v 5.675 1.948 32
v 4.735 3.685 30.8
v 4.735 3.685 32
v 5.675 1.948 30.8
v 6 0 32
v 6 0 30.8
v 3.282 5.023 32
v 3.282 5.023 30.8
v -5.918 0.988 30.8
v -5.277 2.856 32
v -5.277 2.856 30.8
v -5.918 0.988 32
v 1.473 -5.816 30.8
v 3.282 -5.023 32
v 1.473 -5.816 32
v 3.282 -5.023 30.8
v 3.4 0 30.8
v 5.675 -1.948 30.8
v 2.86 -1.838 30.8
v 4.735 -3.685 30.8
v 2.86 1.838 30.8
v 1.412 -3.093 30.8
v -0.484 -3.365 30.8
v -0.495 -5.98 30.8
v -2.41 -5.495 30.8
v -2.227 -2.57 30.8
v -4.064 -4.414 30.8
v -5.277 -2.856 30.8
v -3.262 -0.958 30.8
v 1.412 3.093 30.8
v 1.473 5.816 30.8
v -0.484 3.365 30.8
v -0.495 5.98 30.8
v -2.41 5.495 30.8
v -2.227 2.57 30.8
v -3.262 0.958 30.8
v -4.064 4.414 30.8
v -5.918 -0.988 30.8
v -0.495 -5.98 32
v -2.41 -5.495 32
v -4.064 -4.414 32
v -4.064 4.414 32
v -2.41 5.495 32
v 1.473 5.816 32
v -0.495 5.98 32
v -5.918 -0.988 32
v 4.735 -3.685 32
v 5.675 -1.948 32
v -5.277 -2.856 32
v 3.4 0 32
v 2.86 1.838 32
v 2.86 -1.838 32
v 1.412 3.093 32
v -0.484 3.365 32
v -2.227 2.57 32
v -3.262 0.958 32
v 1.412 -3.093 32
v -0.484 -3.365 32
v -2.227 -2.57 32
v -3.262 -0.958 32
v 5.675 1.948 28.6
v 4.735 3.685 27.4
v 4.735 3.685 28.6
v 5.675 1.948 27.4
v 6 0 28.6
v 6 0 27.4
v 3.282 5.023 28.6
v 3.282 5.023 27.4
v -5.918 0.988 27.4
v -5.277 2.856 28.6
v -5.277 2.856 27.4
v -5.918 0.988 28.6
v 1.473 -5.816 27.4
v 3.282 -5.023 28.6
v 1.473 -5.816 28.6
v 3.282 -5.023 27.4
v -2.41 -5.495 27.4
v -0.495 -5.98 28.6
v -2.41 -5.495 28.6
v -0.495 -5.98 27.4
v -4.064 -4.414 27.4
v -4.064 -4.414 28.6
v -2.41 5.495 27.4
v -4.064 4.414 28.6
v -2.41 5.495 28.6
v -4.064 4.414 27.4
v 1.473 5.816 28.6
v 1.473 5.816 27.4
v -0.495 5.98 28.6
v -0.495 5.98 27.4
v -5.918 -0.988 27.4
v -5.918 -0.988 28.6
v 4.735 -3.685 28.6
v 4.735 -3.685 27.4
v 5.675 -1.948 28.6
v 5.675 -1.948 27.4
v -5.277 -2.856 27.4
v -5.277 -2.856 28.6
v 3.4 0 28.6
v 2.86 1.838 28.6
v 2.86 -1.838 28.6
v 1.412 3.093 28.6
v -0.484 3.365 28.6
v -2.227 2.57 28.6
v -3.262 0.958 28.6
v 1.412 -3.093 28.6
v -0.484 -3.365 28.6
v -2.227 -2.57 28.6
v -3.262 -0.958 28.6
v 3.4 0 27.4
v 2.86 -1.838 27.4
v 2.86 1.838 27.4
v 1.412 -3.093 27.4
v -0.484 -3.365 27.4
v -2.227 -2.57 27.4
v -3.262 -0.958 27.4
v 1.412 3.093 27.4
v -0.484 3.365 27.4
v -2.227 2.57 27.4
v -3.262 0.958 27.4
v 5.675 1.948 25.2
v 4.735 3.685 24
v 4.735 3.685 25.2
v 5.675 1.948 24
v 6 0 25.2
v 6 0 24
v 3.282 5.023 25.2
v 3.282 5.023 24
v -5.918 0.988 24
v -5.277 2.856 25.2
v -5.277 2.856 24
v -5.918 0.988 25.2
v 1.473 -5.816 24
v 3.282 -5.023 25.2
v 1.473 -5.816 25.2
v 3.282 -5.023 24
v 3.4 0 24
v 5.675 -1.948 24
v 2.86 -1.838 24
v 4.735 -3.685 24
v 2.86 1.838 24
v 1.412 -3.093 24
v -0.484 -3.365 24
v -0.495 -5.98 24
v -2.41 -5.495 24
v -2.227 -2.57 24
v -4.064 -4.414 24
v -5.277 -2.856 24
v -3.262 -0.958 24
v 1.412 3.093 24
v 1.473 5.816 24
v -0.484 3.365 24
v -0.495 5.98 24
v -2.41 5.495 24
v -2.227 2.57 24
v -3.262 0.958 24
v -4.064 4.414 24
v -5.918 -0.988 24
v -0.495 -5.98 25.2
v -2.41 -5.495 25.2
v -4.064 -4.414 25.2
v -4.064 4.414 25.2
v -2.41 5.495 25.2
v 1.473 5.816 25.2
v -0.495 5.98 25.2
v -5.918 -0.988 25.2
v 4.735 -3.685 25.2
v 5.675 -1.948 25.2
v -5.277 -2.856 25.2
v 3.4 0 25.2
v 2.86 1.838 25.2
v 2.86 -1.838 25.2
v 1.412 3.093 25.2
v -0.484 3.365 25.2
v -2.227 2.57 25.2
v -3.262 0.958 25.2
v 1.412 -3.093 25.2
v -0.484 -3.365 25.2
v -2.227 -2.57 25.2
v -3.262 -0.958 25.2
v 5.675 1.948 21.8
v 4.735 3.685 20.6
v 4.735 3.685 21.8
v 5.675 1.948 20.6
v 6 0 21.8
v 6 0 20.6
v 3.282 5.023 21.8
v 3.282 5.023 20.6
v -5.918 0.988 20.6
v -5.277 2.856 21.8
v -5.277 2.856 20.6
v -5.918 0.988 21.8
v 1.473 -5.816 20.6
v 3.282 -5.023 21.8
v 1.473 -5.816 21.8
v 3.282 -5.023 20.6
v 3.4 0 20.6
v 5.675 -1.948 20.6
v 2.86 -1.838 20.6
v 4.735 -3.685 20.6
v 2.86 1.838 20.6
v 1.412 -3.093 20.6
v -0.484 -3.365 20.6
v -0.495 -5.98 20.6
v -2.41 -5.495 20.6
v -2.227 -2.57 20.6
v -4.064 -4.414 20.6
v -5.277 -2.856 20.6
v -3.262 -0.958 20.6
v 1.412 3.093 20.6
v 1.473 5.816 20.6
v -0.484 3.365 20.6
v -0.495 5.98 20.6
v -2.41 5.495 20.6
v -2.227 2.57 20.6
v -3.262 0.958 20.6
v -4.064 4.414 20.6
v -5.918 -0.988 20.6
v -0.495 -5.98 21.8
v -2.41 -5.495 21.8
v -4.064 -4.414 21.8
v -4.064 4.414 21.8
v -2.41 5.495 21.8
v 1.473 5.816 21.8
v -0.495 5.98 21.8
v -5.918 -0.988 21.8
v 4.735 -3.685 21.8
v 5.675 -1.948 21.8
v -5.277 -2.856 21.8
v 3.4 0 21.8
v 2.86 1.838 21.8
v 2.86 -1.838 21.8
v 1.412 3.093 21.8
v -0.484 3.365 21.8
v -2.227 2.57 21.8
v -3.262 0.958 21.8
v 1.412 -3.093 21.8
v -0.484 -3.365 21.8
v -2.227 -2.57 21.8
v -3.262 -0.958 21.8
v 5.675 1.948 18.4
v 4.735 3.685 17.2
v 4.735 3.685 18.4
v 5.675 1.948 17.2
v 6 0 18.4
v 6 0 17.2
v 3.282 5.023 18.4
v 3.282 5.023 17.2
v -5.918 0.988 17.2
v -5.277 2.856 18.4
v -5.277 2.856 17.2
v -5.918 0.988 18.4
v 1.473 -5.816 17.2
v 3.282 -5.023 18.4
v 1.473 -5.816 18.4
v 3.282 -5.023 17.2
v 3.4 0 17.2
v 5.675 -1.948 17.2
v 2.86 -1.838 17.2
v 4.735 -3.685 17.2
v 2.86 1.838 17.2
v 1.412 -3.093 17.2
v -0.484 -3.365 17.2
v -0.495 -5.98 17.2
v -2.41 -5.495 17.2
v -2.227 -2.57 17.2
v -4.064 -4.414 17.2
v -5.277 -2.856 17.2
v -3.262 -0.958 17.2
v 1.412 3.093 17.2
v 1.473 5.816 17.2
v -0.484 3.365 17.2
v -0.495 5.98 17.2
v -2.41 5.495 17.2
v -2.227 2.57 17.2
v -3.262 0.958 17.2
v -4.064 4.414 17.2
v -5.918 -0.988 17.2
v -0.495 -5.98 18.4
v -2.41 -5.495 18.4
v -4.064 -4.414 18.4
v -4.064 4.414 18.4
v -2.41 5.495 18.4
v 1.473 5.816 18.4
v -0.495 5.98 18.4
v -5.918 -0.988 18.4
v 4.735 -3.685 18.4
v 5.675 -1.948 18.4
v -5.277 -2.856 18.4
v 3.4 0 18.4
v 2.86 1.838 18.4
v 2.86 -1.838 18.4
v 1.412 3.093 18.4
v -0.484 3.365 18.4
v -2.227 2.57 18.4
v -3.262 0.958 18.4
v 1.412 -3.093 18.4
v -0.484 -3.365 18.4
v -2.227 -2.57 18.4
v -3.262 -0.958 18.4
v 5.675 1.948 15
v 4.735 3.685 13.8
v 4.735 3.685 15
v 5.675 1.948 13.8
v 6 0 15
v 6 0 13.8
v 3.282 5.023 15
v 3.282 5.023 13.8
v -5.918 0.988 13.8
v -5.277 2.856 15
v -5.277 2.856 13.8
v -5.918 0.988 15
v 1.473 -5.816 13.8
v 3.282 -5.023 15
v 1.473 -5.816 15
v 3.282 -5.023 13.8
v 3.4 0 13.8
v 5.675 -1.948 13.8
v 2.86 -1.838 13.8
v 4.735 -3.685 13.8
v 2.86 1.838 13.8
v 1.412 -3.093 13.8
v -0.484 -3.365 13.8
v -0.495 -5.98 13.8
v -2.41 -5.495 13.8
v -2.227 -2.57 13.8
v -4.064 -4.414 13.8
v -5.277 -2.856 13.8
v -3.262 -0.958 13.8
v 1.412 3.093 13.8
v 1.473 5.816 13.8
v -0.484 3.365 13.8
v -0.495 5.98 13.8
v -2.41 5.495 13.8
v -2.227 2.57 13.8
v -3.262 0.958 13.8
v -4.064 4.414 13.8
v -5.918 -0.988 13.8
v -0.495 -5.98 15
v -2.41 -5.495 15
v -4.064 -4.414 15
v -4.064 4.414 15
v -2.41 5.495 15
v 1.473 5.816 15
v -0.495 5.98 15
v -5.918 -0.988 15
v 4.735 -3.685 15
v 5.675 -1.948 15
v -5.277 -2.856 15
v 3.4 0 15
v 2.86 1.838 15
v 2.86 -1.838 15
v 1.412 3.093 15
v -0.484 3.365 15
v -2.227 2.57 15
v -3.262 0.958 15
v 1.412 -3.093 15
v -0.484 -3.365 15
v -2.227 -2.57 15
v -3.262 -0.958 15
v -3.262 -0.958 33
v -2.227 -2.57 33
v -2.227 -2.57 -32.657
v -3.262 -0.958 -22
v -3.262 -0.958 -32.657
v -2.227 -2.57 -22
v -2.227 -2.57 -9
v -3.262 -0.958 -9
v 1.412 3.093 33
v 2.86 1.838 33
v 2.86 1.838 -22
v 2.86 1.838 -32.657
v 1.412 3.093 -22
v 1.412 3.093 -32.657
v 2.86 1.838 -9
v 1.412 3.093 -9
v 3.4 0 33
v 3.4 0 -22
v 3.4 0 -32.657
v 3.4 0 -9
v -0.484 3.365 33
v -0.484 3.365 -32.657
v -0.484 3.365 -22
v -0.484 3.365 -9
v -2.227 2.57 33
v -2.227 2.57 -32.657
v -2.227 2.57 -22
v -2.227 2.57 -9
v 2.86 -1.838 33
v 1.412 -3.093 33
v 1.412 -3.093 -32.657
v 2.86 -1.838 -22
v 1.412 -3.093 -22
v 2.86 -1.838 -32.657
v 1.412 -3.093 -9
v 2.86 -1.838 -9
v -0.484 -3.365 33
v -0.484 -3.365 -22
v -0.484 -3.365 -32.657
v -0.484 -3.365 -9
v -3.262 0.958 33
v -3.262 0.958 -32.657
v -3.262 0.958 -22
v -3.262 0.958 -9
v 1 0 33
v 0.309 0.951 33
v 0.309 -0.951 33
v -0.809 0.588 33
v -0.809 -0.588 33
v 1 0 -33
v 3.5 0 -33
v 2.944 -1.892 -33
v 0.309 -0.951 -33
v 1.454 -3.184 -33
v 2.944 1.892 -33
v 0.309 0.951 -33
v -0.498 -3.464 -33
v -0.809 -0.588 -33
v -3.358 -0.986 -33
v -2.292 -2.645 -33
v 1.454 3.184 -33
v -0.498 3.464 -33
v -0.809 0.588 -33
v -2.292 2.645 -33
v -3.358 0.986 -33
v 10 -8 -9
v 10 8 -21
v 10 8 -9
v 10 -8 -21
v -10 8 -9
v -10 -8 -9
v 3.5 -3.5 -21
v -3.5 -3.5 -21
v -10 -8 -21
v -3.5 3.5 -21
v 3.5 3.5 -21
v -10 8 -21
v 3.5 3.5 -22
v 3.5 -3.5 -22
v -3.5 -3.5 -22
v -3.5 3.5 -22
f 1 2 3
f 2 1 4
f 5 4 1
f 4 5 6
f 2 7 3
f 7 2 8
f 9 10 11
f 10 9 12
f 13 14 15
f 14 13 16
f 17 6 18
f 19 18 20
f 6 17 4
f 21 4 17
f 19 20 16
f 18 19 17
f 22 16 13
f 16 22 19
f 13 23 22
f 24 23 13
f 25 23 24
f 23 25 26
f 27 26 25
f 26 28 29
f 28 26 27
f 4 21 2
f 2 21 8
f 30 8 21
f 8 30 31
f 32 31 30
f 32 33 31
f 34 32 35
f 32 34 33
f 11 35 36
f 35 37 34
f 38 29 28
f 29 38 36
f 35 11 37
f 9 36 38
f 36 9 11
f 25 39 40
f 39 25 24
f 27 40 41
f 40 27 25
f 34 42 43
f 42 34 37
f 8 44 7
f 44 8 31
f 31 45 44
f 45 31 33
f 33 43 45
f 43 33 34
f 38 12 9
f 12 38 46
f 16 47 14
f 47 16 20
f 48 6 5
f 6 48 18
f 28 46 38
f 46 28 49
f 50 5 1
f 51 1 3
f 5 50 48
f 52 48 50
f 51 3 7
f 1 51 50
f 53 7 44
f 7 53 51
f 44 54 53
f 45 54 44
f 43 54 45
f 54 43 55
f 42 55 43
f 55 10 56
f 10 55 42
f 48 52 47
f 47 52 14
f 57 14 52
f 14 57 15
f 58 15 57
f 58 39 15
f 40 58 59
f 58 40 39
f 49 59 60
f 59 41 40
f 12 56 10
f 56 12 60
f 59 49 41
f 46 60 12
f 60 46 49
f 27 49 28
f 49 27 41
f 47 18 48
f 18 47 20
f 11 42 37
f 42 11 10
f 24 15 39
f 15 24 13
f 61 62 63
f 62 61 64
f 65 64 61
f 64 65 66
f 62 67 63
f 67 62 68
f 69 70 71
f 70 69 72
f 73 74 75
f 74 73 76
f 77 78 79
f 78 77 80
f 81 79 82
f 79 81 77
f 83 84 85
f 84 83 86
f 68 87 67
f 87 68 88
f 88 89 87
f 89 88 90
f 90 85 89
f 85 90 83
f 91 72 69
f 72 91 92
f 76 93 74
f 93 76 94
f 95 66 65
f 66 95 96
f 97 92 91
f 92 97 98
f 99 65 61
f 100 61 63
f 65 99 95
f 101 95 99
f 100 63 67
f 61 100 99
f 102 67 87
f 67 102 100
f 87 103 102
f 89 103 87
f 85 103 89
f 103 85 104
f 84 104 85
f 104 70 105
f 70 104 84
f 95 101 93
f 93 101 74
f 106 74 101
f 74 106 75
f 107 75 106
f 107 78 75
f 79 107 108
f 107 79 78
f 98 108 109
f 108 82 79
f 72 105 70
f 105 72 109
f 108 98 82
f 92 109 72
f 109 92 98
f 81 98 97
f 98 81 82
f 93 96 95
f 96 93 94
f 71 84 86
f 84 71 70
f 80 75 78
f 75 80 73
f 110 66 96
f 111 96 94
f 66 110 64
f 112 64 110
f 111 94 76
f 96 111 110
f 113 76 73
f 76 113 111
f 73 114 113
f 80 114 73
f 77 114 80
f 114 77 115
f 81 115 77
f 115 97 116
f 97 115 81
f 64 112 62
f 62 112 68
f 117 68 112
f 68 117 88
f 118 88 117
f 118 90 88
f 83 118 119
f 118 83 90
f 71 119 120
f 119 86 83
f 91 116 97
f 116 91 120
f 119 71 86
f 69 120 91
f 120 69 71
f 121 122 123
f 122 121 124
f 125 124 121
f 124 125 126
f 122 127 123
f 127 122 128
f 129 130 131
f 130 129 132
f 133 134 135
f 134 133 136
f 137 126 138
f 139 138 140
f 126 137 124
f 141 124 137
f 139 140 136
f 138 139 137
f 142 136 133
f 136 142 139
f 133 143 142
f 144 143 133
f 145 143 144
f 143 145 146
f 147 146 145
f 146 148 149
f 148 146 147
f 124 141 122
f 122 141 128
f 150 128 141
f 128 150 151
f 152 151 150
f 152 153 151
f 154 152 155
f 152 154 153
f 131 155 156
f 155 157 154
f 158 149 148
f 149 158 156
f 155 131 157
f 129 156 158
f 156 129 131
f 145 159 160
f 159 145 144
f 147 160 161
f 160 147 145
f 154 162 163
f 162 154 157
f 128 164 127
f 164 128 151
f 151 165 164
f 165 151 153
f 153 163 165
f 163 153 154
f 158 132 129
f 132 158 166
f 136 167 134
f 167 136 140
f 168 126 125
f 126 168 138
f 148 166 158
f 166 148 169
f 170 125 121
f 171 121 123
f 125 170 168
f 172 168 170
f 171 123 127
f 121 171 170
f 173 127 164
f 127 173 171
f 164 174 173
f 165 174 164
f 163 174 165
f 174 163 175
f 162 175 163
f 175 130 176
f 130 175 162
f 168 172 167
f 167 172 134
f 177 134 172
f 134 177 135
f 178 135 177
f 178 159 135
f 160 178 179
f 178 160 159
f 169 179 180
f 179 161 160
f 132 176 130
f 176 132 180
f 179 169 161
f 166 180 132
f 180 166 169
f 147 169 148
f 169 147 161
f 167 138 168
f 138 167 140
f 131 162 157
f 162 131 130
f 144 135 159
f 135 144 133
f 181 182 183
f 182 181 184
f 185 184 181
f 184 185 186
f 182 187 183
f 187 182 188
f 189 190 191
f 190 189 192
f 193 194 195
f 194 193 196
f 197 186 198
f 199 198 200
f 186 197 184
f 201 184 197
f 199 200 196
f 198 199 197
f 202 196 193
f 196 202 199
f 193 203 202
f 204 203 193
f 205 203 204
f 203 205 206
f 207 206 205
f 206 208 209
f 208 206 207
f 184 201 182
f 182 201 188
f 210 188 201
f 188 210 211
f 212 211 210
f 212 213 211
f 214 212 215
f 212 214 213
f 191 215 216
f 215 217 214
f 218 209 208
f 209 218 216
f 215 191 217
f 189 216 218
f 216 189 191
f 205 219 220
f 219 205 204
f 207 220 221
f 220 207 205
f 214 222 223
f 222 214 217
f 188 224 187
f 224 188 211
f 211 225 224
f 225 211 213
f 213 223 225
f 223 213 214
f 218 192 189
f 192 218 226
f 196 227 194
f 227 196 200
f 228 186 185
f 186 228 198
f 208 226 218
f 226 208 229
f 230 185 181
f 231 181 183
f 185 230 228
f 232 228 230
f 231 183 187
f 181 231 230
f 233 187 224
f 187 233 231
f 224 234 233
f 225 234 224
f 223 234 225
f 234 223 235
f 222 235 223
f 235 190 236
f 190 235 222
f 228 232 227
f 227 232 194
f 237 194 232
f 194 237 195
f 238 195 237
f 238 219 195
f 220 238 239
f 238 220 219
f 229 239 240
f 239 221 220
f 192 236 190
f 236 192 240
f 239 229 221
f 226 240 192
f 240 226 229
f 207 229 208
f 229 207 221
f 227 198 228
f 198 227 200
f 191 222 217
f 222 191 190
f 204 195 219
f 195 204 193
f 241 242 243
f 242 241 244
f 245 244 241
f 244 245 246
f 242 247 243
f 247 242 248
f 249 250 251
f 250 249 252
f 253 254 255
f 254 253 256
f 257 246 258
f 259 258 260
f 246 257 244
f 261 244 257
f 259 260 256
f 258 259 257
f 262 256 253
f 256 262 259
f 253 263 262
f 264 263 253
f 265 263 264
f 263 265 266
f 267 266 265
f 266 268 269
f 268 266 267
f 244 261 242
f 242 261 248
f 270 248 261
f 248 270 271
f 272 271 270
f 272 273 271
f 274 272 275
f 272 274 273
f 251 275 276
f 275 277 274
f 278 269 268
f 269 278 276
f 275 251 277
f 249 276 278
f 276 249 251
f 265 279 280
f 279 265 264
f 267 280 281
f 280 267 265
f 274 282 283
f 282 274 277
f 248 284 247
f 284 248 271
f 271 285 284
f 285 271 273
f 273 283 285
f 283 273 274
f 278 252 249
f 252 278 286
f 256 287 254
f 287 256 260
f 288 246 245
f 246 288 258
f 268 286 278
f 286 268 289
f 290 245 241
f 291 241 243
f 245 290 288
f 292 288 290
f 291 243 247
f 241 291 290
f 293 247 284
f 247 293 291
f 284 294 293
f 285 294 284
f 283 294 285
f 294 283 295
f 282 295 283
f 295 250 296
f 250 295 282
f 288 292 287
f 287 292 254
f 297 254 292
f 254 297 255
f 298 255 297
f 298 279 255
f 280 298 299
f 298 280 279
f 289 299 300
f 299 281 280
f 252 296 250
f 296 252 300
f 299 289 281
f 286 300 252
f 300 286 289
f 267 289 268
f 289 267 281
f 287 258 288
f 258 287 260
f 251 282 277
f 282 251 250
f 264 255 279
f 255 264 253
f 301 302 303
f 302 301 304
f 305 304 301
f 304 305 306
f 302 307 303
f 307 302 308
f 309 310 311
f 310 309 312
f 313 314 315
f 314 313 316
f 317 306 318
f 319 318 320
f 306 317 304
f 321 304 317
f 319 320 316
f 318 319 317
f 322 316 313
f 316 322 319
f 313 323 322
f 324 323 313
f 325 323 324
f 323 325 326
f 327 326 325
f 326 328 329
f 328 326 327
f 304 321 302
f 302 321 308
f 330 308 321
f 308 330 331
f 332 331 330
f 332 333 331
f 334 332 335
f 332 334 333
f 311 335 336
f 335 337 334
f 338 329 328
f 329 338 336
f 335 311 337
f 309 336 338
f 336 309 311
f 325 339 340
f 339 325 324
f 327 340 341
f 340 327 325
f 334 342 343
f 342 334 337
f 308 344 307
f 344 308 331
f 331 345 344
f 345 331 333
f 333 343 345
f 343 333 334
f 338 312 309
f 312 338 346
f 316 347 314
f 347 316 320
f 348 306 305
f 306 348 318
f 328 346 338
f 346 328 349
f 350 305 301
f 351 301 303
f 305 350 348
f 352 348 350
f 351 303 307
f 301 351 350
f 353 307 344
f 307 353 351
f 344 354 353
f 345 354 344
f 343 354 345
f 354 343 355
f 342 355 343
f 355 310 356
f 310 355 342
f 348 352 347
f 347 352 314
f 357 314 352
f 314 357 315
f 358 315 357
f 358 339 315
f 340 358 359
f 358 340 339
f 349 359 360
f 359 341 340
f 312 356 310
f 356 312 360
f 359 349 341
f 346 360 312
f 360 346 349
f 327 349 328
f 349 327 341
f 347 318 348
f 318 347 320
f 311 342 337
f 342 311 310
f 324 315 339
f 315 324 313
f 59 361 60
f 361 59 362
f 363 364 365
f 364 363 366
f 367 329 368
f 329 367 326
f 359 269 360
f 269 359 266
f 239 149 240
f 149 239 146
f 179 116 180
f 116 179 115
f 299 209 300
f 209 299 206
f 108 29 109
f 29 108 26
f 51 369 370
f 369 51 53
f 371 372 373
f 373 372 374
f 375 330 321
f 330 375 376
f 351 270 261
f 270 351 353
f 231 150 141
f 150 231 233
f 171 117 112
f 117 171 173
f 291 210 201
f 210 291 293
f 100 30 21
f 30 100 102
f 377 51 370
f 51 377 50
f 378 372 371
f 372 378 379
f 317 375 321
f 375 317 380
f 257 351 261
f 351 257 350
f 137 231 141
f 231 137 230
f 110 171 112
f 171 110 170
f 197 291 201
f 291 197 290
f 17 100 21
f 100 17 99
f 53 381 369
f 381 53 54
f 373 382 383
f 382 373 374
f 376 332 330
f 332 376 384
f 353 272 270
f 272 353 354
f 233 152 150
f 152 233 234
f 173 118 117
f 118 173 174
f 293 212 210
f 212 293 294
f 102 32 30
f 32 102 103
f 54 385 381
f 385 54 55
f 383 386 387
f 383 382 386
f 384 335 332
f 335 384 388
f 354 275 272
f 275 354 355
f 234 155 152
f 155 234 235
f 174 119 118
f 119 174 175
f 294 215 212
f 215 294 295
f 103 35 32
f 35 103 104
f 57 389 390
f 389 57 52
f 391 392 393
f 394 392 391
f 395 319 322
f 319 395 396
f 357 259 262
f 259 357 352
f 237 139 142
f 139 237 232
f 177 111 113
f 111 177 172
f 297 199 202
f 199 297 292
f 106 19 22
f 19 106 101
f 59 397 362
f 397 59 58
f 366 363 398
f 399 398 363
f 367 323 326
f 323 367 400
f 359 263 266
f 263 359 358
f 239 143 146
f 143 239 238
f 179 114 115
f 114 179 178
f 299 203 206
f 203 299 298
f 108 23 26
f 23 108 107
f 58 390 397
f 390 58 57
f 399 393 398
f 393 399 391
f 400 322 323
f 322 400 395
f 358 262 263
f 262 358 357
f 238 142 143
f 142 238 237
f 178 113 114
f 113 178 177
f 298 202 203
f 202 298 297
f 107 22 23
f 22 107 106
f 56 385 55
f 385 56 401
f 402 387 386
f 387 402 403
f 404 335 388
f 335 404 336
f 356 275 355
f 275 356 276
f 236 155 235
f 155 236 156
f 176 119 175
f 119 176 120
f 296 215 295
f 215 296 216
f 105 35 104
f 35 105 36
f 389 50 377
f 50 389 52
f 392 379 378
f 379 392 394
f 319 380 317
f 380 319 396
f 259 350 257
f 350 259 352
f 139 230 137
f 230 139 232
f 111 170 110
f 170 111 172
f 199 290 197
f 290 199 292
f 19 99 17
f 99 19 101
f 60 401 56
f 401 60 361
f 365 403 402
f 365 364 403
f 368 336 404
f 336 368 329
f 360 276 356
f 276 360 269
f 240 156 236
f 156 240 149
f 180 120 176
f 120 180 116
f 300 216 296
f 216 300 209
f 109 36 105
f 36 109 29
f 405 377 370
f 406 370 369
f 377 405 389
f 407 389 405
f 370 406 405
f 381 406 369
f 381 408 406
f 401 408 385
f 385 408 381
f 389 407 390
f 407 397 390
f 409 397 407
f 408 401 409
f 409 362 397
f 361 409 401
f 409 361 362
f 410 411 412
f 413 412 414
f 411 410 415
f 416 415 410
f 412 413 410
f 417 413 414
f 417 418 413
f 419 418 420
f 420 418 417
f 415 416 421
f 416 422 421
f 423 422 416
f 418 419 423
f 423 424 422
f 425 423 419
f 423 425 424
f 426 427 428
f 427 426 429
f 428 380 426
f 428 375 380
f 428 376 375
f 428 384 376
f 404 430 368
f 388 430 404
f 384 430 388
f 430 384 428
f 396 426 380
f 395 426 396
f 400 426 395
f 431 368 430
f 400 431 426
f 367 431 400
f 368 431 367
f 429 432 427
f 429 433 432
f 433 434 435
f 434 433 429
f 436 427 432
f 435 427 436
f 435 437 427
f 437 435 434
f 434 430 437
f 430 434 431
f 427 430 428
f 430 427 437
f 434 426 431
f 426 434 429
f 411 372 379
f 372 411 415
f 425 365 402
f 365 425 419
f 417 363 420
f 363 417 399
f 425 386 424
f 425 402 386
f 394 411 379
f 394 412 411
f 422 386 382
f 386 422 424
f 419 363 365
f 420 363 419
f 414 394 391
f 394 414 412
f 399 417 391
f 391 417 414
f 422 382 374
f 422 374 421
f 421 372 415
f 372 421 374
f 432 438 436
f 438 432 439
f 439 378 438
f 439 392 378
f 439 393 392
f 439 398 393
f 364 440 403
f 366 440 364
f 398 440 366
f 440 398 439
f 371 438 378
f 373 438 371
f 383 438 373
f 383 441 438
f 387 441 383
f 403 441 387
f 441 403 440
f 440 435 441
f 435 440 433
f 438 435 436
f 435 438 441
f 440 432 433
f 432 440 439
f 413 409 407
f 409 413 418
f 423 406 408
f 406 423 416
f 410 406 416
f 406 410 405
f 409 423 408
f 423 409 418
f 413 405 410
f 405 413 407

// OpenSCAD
// Parameters
total_L = 66; //[33:132:1]
barrel_D = 6.8; //[3.4:13.6:0.1]
filament_D = 1.75; //[1:3:0.01]
bore_clearance = 0.25; //[0.1:0.6:0.01]
bore_D = 2; //[1.5:3.5:0.01]
barrel_L = 44; //[22:88:1]
nozzle_L = 12; //[6:24:1]
nozzle_tip_D = 7; //[4:12:0.1]
heater_block_L = 20; //[10:40:1]
heater_block_W = 16; //[8:32:1]
heater_block_H = 12; //[6:24:1]
heatbreak_L = 34; //[17:68:1]
heatbreak_D = 6.8; //[3.4:13.6:0.1]
overlap = 1; //[0.5:2:0.1]
nozzle_hex_AF = 7; //[5:12:0.1]
nozzle_hex_H = 6; //[3:12:0.5]
heater_cartridge_D = 6; //[3:10:0.1]
thermistor_D = 3; //[1.5:6:0.1]
mount_groove_D = 5.8; //[3:10:0.1]
mount_groove_L = 4; //[2:10:0.5]
fin_count = 6; //[3:12:1]
fin_OD = 12; //[8:24:0.5]
fin_thk = 1.2; //[0.6:3:0.1]
fin_gap = 2.2; //[1:5:0.1]
thread_OD = 6; //[4:10:0.1]
thread_L = 6; //[3:15:0.5]
chamfer_Delta = 1; //[0.5:2:0.1]

// Base Shapes
module hotend_barrel() {
  color("Silver")
  cylinder(r=barrel_D/2, h=total_L, center=true);
}

module heater_block() {
  color("DimGray")
  translate([0, 0, -total_L/2 + nozzle_L + heater_block_H/2])
  cube([heater_block_L, heater_block_W, heater_block_H], center=true);
}

module nozzle_tip() {
  color("Copper")
  translate([0, 0, -total_L/2 + nozzle_L/2])
  cylinder(r1=nozzle_tip_D/2, r2=0, h=nozzle_L, center=true);
}

module nozzle_hex_flats() {
  color("Brass")
  translate([0, 0, -total_L/2 + nozzle_L + nozzle_hex_H/2 - overlap])
  cube([nozzle_hex_AF, nozzle_hex_AF, nozzle_hex_H], center=true);
}

module heatbreak_transition() {
  color("Silver")
  translate([0, 0, -total_L/2 + nozzle_L + heater_block_H/2])
  cylinder(r1=barrel_D/2, r2=0, h=heater_block_H, center=true);
}

module threads() {
  color("Silver")
  translate([0, 0, -total_L/2 + nozzle_L + heater_block_H + thread_L/2 - overlap])
  cylinder(r=thread_OD/2, h=thread_L, center=true);
}

module cooling_fin(pos) {
  translate([0, 0, pos])
  cylinder(r=fin_OD/2, h=fin_thk, center=true);
}

module cooling_fins() {
  color("Silver")
  union() {
    for (i = [0:fin_count-1]) {
      cooling_fin(total_L/2 - (fin_thk/2) - overlap - i*(fin_thk + fin_gap));
    }
  }
}

module filament_bore() {
  translate([0, 0, 0])
  cylinder(r=bore_D/2, h=total_L + 2*overlap, center=true);
}

module heater_cartridge_hole() {
  rotate([90, 0, 0])
  translate([0, 0, -total_L/2 + nozzle_L + heater_block_H/2])
  cylinder(r=heater_cartridge_D/2, h=heater_block_W + 2*overlap, center=true);
}

module thermistor_hole() {
  rotate([0, 90, 0])
  translate([0, 0, -total_L/2 + nozzle_L + heater_block_H/2])
  cylinder(r=thermistor_D/2, h=heater_block_L + 2*overlap, center=true);
}

module mounting_groove() {
  translate([0, 0, total_L/2 - mount_groove_L/2 - 2*overlap])
  cylinder(r=barrel_D/2, h=mount_groove_L, center=true);
}

module mounting_groove_cut() {
  translate([0, 0, total_L/2 - mount_groove_L/2 - 2*overlap])
  cylinder(r=mount_groove_D/2, h=mount_groove_L + 2*overlap, center=true);
}

module chamfers_fillets() {
  translate([0, 0, -total_L/2 + chamfer_Delta/2])
  sphere(r=chamfer_Delta/2, center=true);
}

// Operations
module hotend_solids_union() {
  union() {
    hotend_barrel();
    heater_block();
    nozzle_tip();
    nozzle_hex_flats();
    heatbreak_transition();
    threads();
    cooling_fins();
    chamfers_fillets();
  }
}

module mounting_groove_diff() {
  difference() {
    mounting_groove();
    mounting_groove_cut();
  }
}

module hotend_with_mount_groove() {
  union() {
    hotend_solids_union();
    mounting_groove_diff();
  }
}

module hotend_bored() {
  difference() {
    hotend_with_mount_groove();
    filament_bore();
    heater_cartridge_hole();
    thermistor_hole();
  }
}

// Final Output
hotend_bored();
